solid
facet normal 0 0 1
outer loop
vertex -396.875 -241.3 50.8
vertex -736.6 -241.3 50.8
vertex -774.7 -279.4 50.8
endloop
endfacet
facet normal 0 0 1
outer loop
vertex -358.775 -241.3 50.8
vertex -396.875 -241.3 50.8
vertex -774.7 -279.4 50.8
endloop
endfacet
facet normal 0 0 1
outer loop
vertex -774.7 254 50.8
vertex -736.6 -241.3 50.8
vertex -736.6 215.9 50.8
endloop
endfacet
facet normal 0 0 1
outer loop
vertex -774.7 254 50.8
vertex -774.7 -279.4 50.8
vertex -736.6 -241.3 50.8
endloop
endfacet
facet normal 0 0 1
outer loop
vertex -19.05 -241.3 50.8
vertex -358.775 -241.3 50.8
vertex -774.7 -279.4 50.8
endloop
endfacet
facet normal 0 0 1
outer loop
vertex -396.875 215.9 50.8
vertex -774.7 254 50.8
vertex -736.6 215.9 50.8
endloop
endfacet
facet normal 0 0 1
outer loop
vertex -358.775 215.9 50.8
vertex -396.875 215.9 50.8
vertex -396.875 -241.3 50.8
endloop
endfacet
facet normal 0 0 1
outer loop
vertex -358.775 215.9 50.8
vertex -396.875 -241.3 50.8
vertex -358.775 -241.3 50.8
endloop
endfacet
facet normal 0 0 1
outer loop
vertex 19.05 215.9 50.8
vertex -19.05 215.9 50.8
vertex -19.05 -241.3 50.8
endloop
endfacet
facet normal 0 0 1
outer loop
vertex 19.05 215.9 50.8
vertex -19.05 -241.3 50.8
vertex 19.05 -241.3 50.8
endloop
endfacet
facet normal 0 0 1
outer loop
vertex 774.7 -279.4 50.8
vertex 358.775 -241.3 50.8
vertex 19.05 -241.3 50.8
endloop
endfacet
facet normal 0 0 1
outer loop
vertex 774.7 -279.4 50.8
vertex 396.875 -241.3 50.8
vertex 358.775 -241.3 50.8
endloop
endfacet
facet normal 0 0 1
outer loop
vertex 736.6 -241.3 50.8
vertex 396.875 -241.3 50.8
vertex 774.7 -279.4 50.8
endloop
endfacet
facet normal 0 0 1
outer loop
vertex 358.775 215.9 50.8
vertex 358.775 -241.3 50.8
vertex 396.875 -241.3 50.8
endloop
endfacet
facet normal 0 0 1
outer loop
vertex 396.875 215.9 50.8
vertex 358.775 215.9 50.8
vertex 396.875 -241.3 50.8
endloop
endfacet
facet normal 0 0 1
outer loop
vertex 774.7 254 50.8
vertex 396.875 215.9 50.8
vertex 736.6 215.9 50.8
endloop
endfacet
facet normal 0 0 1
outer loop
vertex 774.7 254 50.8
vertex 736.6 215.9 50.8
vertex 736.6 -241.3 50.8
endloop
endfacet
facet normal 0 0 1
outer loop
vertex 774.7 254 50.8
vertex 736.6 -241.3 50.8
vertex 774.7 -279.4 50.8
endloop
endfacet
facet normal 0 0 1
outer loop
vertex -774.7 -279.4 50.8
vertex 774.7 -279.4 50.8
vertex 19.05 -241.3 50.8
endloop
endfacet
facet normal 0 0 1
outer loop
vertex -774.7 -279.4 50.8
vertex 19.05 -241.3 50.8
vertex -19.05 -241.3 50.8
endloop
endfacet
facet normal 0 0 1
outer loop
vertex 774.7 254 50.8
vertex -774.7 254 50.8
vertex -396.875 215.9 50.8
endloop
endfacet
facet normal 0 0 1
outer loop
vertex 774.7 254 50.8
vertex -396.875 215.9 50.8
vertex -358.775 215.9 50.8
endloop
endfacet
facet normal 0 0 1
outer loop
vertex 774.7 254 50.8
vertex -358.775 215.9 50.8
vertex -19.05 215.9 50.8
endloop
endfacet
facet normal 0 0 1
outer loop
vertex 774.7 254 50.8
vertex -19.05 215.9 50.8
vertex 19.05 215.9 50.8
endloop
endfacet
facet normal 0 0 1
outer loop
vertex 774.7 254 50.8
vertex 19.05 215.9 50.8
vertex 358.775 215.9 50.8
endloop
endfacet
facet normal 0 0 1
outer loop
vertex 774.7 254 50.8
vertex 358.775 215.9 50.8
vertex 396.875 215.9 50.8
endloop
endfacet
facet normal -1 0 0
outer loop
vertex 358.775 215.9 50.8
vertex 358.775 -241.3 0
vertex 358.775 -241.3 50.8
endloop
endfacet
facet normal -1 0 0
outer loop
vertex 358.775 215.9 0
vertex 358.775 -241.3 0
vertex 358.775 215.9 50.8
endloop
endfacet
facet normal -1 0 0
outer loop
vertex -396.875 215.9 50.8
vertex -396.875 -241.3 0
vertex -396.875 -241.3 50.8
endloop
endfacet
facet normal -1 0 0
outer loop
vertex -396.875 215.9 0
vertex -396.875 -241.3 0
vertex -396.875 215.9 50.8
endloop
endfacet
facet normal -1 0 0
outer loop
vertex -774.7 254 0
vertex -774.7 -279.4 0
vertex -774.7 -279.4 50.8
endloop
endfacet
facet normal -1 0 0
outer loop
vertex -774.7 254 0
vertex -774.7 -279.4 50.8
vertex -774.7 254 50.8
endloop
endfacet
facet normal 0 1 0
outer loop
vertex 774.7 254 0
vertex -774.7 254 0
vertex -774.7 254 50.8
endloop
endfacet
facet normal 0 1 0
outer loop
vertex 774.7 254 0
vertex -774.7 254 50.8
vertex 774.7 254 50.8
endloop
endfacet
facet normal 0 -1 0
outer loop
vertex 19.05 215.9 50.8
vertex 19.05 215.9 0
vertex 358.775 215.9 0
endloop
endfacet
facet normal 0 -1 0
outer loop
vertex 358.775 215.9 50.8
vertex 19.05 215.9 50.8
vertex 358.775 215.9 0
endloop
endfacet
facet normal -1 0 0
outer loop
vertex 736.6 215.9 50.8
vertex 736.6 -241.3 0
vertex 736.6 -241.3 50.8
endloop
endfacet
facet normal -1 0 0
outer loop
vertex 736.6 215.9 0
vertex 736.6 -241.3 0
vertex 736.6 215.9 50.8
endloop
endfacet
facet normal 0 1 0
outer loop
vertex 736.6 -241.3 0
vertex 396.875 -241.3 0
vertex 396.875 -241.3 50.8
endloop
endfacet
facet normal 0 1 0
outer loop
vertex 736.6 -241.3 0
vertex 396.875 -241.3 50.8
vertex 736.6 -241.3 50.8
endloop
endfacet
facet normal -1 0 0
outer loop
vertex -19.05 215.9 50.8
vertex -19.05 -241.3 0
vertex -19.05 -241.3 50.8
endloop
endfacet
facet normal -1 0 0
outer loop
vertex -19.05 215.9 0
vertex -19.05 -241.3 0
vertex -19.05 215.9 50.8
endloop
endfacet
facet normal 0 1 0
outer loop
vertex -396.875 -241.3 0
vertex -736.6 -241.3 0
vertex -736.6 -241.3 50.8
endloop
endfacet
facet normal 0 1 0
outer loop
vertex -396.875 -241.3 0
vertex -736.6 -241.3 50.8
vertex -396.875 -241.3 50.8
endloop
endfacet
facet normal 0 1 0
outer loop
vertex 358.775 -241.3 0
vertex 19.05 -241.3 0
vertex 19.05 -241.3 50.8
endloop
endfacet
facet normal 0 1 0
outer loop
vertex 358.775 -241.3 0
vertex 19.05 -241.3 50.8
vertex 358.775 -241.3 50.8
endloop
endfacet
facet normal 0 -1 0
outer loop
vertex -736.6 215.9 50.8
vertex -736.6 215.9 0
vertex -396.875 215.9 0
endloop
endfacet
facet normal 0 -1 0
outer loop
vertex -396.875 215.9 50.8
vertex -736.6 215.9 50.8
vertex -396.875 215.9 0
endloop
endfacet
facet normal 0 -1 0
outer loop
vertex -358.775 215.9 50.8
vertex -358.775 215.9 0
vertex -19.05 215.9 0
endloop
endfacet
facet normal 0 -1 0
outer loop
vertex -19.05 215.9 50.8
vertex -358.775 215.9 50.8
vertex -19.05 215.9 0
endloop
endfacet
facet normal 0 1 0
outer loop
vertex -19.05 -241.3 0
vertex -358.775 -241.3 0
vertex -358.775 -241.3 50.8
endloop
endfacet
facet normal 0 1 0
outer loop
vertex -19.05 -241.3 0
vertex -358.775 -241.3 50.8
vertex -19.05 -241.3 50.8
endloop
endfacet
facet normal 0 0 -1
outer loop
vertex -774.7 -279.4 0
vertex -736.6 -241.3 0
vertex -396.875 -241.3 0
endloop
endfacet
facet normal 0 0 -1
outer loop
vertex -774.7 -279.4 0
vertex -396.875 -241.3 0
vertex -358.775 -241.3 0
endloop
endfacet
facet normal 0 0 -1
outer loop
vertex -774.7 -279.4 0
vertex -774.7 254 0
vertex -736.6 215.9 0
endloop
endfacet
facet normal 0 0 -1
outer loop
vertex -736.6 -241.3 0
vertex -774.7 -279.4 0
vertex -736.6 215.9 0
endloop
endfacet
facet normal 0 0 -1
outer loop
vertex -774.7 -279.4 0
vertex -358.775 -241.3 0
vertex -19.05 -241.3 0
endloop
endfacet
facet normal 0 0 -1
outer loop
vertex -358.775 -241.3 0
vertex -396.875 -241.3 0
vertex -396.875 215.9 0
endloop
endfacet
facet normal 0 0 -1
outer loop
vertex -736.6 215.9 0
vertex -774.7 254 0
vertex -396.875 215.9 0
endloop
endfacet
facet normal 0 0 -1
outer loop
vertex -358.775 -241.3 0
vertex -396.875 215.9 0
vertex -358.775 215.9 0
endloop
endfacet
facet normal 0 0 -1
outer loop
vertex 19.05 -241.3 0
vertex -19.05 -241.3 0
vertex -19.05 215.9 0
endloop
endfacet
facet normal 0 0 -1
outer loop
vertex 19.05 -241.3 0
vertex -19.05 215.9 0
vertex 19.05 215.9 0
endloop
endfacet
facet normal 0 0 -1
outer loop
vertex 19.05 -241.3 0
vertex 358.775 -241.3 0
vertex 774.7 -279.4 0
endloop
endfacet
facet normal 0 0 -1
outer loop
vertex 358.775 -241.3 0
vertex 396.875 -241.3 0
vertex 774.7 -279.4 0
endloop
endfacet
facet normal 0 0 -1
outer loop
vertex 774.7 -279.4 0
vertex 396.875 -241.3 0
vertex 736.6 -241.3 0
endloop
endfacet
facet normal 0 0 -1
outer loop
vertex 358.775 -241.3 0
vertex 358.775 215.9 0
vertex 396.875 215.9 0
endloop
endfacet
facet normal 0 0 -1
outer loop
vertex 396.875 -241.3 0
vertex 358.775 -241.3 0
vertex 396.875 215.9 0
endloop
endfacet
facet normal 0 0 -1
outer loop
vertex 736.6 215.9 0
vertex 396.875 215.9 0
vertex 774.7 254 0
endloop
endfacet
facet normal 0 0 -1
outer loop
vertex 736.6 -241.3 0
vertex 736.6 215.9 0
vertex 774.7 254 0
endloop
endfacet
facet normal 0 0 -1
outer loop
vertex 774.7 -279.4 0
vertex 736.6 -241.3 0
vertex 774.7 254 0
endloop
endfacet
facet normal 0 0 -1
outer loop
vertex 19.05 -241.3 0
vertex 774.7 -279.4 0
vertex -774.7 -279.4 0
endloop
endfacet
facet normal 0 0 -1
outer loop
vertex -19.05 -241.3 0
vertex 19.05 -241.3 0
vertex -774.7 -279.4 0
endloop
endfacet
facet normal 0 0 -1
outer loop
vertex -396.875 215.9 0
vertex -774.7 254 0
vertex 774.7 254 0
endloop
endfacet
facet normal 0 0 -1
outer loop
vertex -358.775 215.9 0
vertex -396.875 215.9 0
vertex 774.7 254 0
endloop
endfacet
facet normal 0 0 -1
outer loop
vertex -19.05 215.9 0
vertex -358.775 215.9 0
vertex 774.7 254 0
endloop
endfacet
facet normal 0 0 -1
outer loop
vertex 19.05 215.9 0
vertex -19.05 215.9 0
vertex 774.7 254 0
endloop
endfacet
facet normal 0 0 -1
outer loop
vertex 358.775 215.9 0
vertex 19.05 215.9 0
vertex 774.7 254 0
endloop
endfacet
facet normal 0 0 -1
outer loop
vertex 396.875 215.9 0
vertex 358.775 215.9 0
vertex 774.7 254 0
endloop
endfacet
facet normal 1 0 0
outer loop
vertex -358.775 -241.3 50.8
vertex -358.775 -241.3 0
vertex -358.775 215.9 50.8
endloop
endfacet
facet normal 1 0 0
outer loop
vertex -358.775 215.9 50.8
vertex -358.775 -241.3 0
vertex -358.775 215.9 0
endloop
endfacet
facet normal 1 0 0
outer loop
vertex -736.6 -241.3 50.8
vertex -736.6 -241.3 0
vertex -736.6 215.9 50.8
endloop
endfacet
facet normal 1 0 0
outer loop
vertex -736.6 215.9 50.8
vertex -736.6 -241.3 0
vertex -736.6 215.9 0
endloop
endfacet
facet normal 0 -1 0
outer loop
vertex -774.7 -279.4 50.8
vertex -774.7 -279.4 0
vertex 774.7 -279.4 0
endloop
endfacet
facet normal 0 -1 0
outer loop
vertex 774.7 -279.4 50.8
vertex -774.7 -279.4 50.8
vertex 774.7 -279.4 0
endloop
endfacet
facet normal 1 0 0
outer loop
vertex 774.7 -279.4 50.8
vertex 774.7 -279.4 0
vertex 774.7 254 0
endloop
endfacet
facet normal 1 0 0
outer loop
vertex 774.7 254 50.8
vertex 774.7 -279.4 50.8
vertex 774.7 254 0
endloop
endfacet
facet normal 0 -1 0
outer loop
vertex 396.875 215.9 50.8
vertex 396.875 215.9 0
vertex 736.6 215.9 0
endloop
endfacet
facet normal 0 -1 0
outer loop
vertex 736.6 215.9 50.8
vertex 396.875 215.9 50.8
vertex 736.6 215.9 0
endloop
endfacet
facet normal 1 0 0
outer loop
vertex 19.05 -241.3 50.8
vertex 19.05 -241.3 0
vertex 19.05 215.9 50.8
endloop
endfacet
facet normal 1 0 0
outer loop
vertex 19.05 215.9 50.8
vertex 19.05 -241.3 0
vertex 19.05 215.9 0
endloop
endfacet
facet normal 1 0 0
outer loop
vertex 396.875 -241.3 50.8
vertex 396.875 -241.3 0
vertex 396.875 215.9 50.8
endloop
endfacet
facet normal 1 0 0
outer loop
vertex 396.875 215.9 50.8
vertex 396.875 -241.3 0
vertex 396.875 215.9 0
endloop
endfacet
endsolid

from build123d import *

# Parameters (mm, degrees)
F0_W     = 1549.4
F0_H     = 38.1
F1_DEPTH = 50.8
F2_W     = 38.1
F2_H     = 457.2
F3_DEPTH = 50.8


with BuildPart() as f1:
    # F0 (on Top) → F1 (new body)
    with BuildSketch(Plane.XY):
        with Locations((0, 234.95)):
            Rectangle(F0_W, F0_H)
        with Locations((0, -260.35)):
            Rectangle(F0_W, F0_H)
    extrude(amount=F1_DEPTH)

    # F2 (on Top) → F3 (join, through all)
    with BuildSketch(Plane.XY):
        with Locations((-755.65, -12.7)):
            Rectangle(F2_W, F2_H)
        with Locations((-377.825, -12.7)):
            Rectangle(F2_W, F2_H)
        with Locations((0, -12.7)):
            Rectangle(F2_W, F2_H)
        with Locations((377.825, -12.7)):
            Rectangle(F2_W, F2_H)
        with Locations((755.65, -12.7)):
            Rectangle(F2_W, F2_H)
    extrude(amount=F3_DEPTH)


solid = f1.part
